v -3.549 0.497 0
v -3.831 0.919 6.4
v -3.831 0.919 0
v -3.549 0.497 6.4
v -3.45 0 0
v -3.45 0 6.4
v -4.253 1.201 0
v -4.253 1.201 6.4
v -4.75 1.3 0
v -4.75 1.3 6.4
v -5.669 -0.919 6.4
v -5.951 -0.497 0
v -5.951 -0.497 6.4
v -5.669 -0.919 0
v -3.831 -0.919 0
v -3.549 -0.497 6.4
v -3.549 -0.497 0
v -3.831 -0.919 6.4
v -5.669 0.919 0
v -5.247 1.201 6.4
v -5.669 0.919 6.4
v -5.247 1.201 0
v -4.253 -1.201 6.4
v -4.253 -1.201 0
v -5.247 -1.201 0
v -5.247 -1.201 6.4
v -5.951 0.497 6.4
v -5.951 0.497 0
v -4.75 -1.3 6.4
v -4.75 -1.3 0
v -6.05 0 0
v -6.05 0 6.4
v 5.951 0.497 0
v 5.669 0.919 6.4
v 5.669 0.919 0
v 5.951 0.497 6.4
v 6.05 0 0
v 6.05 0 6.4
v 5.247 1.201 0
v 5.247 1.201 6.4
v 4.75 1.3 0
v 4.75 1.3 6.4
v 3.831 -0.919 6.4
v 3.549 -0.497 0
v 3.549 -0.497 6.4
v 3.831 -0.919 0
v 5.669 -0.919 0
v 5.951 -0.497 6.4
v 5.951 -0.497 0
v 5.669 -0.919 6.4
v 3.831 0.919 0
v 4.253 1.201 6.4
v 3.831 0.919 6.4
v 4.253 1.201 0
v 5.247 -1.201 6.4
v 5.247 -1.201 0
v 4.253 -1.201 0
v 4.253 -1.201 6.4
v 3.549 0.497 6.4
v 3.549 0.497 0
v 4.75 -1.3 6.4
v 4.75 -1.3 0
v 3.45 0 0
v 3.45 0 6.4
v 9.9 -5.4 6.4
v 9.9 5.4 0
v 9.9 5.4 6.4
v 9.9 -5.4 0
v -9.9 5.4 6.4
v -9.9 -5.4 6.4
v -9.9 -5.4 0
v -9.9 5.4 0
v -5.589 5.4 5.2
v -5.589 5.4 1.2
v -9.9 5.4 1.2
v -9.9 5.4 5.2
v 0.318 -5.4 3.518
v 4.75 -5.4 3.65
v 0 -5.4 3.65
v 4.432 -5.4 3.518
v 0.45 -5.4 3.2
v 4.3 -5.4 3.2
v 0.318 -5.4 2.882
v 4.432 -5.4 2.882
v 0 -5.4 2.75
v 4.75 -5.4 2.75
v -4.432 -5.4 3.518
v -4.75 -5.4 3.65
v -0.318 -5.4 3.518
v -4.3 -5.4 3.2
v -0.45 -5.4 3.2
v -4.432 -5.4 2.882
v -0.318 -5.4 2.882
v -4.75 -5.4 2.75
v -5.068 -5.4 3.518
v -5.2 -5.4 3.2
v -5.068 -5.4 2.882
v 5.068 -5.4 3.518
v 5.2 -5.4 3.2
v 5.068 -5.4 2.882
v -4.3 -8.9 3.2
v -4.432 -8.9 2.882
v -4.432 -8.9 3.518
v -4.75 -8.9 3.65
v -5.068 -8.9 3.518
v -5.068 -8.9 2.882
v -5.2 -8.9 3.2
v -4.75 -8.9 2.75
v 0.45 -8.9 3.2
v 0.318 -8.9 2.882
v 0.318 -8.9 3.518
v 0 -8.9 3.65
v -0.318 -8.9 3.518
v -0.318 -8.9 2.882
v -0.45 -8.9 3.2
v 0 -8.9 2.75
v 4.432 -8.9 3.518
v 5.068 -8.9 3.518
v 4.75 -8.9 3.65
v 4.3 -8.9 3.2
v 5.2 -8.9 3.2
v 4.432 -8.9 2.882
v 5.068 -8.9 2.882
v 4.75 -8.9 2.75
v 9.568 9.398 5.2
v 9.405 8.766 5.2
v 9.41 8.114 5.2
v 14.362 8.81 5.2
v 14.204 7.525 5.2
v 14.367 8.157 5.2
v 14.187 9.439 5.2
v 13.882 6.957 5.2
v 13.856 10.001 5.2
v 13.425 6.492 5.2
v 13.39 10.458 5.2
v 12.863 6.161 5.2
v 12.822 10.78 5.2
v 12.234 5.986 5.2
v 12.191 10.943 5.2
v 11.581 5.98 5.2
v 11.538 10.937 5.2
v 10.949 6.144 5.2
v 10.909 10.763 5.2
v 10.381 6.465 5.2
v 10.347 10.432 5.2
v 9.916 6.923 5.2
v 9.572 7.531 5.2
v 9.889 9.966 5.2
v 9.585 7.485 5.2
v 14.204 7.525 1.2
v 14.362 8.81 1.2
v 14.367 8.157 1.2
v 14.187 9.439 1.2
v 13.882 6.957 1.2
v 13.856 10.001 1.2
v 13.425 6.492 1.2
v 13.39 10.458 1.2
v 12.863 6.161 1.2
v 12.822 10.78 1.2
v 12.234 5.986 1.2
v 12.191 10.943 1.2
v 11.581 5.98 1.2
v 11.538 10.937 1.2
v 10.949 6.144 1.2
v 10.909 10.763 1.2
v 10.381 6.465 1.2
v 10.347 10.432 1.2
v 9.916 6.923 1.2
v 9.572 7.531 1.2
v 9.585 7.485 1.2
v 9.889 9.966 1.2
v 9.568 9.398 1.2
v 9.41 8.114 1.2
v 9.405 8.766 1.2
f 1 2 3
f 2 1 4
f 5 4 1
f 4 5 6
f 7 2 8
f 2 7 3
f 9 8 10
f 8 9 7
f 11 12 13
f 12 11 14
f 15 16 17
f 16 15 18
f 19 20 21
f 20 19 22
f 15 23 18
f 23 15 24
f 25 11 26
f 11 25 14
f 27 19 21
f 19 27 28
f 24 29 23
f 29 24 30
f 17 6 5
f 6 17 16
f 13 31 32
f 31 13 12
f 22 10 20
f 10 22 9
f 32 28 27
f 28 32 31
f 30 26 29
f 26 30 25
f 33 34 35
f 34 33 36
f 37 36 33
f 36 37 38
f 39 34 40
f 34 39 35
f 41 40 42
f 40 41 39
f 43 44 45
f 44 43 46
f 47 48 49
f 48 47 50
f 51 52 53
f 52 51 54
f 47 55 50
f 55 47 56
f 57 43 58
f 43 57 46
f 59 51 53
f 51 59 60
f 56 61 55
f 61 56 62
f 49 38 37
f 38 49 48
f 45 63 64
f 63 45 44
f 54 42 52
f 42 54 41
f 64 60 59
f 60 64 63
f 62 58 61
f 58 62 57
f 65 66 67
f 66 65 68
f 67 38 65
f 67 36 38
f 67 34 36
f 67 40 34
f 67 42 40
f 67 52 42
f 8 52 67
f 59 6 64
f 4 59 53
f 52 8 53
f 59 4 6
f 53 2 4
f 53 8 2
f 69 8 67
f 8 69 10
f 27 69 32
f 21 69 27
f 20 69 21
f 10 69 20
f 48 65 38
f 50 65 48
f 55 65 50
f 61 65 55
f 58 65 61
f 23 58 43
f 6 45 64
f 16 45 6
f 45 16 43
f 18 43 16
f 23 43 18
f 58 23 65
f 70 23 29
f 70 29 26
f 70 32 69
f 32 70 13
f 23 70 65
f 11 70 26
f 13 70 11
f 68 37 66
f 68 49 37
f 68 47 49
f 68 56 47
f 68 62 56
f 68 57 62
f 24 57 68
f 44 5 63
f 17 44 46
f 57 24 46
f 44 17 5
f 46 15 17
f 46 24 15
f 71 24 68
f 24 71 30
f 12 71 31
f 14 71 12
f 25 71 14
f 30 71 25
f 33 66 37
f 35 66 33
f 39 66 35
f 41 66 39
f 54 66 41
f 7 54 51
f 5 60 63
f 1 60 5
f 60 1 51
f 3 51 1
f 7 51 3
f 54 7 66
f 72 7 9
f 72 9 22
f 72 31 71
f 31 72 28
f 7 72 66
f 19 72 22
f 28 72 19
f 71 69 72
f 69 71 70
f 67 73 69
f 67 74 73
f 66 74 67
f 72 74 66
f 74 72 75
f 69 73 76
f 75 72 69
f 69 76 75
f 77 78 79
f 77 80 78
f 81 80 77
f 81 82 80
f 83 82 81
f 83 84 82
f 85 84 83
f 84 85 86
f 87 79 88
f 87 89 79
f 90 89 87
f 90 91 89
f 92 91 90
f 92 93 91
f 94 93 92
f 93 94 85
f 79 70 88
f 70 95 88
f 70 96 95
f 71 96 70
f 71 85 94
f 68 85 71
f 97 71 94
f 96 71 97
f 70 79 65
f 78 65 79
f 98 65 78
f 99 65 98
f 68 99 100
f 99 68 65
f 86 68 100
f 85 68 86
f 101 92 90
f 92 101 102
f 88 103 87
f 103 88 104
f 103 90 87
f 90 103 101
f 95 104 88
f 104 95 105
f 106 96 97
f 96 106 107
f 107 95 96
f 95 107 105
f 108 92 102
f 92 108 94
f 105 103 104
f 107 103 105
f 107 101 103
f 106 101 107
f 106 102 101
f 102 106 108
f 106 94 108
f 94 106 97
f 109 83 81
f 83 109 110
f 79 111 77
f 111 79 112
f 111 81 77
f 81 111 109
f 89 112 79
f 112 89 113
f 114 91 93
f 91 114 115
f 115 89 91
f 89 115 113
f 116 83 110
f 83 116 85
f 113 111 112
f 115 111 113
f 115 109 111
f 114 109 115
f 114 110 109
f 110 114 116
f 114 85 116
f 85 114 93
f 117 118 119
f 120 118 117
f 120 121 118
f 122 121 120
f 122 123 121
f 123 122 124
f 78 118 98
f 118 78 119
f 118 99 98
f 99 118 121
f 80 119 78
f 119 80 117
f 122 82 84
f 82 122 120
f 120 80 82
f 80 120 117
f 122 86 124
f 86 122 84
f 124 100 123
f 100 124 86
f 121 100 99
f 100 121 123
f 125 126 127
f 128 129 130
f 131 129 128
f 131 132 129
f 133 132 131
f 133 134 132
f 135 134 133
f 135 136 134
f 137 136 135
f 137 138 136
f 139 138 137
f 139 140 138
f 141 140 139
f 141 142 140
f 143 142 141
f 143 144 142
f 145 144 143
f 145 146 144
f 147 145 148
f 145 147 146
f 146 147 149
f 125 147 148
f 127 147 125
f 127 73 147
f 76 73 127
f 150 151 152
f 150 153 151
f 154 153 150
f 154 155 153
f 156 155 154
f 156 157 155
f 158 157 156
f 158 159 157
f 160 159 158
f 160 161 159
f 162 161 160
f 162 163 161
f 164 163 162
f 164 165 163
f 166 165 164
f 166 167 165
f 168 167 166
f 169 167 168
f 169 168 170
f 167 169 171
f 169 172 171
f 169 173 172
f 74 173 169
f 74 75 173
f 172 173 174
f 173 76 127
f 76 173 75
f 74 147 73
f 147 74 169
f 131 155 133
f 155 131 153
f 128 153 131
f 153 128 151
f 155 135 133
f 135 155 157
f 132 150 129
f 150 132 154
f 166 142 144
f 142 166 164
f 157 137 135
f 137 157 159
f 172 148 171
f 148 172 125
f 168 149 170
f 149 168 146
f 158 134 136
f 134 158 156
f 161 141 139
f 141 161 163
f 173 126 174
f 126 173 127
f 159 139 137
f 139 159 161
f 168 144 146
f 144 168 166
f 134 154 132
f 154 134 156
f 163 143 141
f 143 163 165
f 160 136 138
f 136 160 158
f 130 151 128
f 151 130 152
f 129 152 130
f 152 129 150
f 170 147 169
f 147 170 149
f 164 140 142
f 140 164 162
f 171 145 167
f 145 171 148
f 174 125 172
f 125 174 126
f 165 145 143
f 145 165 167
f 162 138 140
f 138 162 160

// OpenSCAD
// file: ../lib/vitamins/kw12_limit_switch.scad
// 용어
// 1. 리미트 스위치(limit switch)
// 2. 비타민 목업(vitamin mockup)
// 3. 장착홀 피치(mounting hole pitch)
// 4. 단자 피치(terminal pitch)
// 5. 레버 스트립(lever strip)
// 6. 롤러(roller)

// KW12 기계식 부품의 외형 검토용 모델입니다.
// 원점은 본체 바닥 면적 중심이고 Z는 본체 바닥에서 시작합니다.

$fa = 6;
$fs = 0.6;

// 치수 배열 순서: [길이, 높이, 두께] (mm).
function kw12_limit_switch_body_size() = [19.8, 10.8, 6.4];

module _kw12_body(size, hole_pitch, hole_d, part_color) {
    length = size[0];
    height = size[1];
    thickness = size[2];
    eps = 0.1;

    assert(length > 0, "KW12 본체 길이(length)는 양수여야 합니다");
    assert(height > 0, "KW12 본체 높이(height)는 양수여야 합니다");
    assert(thickness > 0, "KW12 본체 두께(thickness)는 양수여야 합니다");
    assert(hole_pitch > 0, "KW12 장착홀 피치(hole_pitch)는 양수여야 합니다");
    assert(hole_d > 0, "KW12 장착홀 지름(hole_d)은 양수여야 합니다");

    color(part_color)
        translate([-length / 2, -height / 2, 0])
            difference() {
                cube(size);
                for (x = [-hole_pitch / 2, hole_pitch / 2])
                    translate([length / 2 + x, height / 2, -eps])
                        cylinder(d = hole_d, h = thickness + 2 * eps, $fn = 16);
            }
}

module _kw12_terminals(size, terminal_pitch, terminal_d, terminal_len, part_color) {
    height = size[1];
    thickness = size[2];

    assert(terminal_pitch > 0, "KW12 단자 피치(terminal_pitch)는 양수여야 합니다");
    assert(terminal_d > 0, "KW12 단자 지름(terminal_d)은 양수여야 합니다");
    assert(terminal_len > 0, "KW12 단자 길이(terminal_len)는 양수여야 합니다");

    color(part_color)
        for (x = [-terminal_pitch / 2, 0, terminal_pitch / 2])
            translate([x, -height / 2, thickness / 2])
                rotate([90, 0, 0])
                    cylinder(d = terminal_d, h = terminal_len, $fn = 8);
}

module _kw12_lever(size, lever_len, lever_rise, strip_w, strip_h, roller_d, roller_w, part_color) {
    length = size[0];
    height = size[1];
    thickness = size[2];
    lever_anchor = [-length / 2, height / 2, thickness / 2];
    strip_corner = [0, -strip_w, -strip_h / 2];

    assert(lever_len > 0, "KW12 레버 길이(lever_len)는 양수여야 합니다");
    assert(strip_w > 0, "KW12 레버 스트립 폭(strip_w)은 양수여야 합니다");
    assert(strip_h > 0, "KW12 레버 스트립 높이(strip_h)는 양수여야 합니다");
    assert(roller_d > 0, "KW12 롤러 지름(roller_d)은 양수여야 합니다");
    assert(roller_w > 0, "KW12 롤러 폭(roller_w)은 양수여야 합니다");

    color(part_color)
        translate(lever_anchor)
            rotate([0, 0, lever_rise]) {
                translate(strip_corner)
                    cube([lever_len, strip_w, strip_h]);
                translate([lever_len, 0, 0])
                    cylinder(d = roller_d, h = roller_w, center = true, $fn = 24);
            }
}

module kw12_limit_switch(body_color = "#1f2933", lever_color = "#c4ccd4", pin_color = "#c8a23c") {
    body = kw12_limit_switch_body_size();

    mount_hole_pitch = 9.5;
    mount_hole_d = 2.6;

    terminal_pitch = 9.5;
    terminal_d = 0.9;
    terminal_len = 3.5;

    lever_len = 22;
    lever_rise = 8;
    strip_w = 0.6;
    strip_h = 4;
    roller_d = 5;
    roller_w = 4;

    _kw12_body(size = body,
               hole_pitch = mount_hole_pitch,
               hole_d = mount_hole_d,
               part_color = body_color);
    _kw12_terminals(size = body,
                    terminal_pitch = terminal_pitch,
                    terminal_d = terminal_d,
                    terminal_len = terminal_len,
                    part_color = pin_color);
    _kw12_lever(size = body,
                lever_len = lever_len,
                lever_rise = lever_rise,
                strip_w = strip_w,
                strip_h = strip_h,
                roller_d = roller_d,
                roller_w = roller_w,
                part_color = lever_color);
}

kw12_limit_switch();
// main file
// 디버그(debug): 리미트 스위치(limit switch) 단품의 레버(lever), 롤러(roller), 색상(color)을 확인합니다.
//
// 용어
// 1. 디버그(Debug)
// 2. 리미트 스위치(Limit switch)
// 3. 레버(Lever)
// 4. 롤러(Roller)
// 5. 단품(Individual part)
use <../lib/vitamins/kw12_limit_switch.scad>

kw12_limit_switch();
